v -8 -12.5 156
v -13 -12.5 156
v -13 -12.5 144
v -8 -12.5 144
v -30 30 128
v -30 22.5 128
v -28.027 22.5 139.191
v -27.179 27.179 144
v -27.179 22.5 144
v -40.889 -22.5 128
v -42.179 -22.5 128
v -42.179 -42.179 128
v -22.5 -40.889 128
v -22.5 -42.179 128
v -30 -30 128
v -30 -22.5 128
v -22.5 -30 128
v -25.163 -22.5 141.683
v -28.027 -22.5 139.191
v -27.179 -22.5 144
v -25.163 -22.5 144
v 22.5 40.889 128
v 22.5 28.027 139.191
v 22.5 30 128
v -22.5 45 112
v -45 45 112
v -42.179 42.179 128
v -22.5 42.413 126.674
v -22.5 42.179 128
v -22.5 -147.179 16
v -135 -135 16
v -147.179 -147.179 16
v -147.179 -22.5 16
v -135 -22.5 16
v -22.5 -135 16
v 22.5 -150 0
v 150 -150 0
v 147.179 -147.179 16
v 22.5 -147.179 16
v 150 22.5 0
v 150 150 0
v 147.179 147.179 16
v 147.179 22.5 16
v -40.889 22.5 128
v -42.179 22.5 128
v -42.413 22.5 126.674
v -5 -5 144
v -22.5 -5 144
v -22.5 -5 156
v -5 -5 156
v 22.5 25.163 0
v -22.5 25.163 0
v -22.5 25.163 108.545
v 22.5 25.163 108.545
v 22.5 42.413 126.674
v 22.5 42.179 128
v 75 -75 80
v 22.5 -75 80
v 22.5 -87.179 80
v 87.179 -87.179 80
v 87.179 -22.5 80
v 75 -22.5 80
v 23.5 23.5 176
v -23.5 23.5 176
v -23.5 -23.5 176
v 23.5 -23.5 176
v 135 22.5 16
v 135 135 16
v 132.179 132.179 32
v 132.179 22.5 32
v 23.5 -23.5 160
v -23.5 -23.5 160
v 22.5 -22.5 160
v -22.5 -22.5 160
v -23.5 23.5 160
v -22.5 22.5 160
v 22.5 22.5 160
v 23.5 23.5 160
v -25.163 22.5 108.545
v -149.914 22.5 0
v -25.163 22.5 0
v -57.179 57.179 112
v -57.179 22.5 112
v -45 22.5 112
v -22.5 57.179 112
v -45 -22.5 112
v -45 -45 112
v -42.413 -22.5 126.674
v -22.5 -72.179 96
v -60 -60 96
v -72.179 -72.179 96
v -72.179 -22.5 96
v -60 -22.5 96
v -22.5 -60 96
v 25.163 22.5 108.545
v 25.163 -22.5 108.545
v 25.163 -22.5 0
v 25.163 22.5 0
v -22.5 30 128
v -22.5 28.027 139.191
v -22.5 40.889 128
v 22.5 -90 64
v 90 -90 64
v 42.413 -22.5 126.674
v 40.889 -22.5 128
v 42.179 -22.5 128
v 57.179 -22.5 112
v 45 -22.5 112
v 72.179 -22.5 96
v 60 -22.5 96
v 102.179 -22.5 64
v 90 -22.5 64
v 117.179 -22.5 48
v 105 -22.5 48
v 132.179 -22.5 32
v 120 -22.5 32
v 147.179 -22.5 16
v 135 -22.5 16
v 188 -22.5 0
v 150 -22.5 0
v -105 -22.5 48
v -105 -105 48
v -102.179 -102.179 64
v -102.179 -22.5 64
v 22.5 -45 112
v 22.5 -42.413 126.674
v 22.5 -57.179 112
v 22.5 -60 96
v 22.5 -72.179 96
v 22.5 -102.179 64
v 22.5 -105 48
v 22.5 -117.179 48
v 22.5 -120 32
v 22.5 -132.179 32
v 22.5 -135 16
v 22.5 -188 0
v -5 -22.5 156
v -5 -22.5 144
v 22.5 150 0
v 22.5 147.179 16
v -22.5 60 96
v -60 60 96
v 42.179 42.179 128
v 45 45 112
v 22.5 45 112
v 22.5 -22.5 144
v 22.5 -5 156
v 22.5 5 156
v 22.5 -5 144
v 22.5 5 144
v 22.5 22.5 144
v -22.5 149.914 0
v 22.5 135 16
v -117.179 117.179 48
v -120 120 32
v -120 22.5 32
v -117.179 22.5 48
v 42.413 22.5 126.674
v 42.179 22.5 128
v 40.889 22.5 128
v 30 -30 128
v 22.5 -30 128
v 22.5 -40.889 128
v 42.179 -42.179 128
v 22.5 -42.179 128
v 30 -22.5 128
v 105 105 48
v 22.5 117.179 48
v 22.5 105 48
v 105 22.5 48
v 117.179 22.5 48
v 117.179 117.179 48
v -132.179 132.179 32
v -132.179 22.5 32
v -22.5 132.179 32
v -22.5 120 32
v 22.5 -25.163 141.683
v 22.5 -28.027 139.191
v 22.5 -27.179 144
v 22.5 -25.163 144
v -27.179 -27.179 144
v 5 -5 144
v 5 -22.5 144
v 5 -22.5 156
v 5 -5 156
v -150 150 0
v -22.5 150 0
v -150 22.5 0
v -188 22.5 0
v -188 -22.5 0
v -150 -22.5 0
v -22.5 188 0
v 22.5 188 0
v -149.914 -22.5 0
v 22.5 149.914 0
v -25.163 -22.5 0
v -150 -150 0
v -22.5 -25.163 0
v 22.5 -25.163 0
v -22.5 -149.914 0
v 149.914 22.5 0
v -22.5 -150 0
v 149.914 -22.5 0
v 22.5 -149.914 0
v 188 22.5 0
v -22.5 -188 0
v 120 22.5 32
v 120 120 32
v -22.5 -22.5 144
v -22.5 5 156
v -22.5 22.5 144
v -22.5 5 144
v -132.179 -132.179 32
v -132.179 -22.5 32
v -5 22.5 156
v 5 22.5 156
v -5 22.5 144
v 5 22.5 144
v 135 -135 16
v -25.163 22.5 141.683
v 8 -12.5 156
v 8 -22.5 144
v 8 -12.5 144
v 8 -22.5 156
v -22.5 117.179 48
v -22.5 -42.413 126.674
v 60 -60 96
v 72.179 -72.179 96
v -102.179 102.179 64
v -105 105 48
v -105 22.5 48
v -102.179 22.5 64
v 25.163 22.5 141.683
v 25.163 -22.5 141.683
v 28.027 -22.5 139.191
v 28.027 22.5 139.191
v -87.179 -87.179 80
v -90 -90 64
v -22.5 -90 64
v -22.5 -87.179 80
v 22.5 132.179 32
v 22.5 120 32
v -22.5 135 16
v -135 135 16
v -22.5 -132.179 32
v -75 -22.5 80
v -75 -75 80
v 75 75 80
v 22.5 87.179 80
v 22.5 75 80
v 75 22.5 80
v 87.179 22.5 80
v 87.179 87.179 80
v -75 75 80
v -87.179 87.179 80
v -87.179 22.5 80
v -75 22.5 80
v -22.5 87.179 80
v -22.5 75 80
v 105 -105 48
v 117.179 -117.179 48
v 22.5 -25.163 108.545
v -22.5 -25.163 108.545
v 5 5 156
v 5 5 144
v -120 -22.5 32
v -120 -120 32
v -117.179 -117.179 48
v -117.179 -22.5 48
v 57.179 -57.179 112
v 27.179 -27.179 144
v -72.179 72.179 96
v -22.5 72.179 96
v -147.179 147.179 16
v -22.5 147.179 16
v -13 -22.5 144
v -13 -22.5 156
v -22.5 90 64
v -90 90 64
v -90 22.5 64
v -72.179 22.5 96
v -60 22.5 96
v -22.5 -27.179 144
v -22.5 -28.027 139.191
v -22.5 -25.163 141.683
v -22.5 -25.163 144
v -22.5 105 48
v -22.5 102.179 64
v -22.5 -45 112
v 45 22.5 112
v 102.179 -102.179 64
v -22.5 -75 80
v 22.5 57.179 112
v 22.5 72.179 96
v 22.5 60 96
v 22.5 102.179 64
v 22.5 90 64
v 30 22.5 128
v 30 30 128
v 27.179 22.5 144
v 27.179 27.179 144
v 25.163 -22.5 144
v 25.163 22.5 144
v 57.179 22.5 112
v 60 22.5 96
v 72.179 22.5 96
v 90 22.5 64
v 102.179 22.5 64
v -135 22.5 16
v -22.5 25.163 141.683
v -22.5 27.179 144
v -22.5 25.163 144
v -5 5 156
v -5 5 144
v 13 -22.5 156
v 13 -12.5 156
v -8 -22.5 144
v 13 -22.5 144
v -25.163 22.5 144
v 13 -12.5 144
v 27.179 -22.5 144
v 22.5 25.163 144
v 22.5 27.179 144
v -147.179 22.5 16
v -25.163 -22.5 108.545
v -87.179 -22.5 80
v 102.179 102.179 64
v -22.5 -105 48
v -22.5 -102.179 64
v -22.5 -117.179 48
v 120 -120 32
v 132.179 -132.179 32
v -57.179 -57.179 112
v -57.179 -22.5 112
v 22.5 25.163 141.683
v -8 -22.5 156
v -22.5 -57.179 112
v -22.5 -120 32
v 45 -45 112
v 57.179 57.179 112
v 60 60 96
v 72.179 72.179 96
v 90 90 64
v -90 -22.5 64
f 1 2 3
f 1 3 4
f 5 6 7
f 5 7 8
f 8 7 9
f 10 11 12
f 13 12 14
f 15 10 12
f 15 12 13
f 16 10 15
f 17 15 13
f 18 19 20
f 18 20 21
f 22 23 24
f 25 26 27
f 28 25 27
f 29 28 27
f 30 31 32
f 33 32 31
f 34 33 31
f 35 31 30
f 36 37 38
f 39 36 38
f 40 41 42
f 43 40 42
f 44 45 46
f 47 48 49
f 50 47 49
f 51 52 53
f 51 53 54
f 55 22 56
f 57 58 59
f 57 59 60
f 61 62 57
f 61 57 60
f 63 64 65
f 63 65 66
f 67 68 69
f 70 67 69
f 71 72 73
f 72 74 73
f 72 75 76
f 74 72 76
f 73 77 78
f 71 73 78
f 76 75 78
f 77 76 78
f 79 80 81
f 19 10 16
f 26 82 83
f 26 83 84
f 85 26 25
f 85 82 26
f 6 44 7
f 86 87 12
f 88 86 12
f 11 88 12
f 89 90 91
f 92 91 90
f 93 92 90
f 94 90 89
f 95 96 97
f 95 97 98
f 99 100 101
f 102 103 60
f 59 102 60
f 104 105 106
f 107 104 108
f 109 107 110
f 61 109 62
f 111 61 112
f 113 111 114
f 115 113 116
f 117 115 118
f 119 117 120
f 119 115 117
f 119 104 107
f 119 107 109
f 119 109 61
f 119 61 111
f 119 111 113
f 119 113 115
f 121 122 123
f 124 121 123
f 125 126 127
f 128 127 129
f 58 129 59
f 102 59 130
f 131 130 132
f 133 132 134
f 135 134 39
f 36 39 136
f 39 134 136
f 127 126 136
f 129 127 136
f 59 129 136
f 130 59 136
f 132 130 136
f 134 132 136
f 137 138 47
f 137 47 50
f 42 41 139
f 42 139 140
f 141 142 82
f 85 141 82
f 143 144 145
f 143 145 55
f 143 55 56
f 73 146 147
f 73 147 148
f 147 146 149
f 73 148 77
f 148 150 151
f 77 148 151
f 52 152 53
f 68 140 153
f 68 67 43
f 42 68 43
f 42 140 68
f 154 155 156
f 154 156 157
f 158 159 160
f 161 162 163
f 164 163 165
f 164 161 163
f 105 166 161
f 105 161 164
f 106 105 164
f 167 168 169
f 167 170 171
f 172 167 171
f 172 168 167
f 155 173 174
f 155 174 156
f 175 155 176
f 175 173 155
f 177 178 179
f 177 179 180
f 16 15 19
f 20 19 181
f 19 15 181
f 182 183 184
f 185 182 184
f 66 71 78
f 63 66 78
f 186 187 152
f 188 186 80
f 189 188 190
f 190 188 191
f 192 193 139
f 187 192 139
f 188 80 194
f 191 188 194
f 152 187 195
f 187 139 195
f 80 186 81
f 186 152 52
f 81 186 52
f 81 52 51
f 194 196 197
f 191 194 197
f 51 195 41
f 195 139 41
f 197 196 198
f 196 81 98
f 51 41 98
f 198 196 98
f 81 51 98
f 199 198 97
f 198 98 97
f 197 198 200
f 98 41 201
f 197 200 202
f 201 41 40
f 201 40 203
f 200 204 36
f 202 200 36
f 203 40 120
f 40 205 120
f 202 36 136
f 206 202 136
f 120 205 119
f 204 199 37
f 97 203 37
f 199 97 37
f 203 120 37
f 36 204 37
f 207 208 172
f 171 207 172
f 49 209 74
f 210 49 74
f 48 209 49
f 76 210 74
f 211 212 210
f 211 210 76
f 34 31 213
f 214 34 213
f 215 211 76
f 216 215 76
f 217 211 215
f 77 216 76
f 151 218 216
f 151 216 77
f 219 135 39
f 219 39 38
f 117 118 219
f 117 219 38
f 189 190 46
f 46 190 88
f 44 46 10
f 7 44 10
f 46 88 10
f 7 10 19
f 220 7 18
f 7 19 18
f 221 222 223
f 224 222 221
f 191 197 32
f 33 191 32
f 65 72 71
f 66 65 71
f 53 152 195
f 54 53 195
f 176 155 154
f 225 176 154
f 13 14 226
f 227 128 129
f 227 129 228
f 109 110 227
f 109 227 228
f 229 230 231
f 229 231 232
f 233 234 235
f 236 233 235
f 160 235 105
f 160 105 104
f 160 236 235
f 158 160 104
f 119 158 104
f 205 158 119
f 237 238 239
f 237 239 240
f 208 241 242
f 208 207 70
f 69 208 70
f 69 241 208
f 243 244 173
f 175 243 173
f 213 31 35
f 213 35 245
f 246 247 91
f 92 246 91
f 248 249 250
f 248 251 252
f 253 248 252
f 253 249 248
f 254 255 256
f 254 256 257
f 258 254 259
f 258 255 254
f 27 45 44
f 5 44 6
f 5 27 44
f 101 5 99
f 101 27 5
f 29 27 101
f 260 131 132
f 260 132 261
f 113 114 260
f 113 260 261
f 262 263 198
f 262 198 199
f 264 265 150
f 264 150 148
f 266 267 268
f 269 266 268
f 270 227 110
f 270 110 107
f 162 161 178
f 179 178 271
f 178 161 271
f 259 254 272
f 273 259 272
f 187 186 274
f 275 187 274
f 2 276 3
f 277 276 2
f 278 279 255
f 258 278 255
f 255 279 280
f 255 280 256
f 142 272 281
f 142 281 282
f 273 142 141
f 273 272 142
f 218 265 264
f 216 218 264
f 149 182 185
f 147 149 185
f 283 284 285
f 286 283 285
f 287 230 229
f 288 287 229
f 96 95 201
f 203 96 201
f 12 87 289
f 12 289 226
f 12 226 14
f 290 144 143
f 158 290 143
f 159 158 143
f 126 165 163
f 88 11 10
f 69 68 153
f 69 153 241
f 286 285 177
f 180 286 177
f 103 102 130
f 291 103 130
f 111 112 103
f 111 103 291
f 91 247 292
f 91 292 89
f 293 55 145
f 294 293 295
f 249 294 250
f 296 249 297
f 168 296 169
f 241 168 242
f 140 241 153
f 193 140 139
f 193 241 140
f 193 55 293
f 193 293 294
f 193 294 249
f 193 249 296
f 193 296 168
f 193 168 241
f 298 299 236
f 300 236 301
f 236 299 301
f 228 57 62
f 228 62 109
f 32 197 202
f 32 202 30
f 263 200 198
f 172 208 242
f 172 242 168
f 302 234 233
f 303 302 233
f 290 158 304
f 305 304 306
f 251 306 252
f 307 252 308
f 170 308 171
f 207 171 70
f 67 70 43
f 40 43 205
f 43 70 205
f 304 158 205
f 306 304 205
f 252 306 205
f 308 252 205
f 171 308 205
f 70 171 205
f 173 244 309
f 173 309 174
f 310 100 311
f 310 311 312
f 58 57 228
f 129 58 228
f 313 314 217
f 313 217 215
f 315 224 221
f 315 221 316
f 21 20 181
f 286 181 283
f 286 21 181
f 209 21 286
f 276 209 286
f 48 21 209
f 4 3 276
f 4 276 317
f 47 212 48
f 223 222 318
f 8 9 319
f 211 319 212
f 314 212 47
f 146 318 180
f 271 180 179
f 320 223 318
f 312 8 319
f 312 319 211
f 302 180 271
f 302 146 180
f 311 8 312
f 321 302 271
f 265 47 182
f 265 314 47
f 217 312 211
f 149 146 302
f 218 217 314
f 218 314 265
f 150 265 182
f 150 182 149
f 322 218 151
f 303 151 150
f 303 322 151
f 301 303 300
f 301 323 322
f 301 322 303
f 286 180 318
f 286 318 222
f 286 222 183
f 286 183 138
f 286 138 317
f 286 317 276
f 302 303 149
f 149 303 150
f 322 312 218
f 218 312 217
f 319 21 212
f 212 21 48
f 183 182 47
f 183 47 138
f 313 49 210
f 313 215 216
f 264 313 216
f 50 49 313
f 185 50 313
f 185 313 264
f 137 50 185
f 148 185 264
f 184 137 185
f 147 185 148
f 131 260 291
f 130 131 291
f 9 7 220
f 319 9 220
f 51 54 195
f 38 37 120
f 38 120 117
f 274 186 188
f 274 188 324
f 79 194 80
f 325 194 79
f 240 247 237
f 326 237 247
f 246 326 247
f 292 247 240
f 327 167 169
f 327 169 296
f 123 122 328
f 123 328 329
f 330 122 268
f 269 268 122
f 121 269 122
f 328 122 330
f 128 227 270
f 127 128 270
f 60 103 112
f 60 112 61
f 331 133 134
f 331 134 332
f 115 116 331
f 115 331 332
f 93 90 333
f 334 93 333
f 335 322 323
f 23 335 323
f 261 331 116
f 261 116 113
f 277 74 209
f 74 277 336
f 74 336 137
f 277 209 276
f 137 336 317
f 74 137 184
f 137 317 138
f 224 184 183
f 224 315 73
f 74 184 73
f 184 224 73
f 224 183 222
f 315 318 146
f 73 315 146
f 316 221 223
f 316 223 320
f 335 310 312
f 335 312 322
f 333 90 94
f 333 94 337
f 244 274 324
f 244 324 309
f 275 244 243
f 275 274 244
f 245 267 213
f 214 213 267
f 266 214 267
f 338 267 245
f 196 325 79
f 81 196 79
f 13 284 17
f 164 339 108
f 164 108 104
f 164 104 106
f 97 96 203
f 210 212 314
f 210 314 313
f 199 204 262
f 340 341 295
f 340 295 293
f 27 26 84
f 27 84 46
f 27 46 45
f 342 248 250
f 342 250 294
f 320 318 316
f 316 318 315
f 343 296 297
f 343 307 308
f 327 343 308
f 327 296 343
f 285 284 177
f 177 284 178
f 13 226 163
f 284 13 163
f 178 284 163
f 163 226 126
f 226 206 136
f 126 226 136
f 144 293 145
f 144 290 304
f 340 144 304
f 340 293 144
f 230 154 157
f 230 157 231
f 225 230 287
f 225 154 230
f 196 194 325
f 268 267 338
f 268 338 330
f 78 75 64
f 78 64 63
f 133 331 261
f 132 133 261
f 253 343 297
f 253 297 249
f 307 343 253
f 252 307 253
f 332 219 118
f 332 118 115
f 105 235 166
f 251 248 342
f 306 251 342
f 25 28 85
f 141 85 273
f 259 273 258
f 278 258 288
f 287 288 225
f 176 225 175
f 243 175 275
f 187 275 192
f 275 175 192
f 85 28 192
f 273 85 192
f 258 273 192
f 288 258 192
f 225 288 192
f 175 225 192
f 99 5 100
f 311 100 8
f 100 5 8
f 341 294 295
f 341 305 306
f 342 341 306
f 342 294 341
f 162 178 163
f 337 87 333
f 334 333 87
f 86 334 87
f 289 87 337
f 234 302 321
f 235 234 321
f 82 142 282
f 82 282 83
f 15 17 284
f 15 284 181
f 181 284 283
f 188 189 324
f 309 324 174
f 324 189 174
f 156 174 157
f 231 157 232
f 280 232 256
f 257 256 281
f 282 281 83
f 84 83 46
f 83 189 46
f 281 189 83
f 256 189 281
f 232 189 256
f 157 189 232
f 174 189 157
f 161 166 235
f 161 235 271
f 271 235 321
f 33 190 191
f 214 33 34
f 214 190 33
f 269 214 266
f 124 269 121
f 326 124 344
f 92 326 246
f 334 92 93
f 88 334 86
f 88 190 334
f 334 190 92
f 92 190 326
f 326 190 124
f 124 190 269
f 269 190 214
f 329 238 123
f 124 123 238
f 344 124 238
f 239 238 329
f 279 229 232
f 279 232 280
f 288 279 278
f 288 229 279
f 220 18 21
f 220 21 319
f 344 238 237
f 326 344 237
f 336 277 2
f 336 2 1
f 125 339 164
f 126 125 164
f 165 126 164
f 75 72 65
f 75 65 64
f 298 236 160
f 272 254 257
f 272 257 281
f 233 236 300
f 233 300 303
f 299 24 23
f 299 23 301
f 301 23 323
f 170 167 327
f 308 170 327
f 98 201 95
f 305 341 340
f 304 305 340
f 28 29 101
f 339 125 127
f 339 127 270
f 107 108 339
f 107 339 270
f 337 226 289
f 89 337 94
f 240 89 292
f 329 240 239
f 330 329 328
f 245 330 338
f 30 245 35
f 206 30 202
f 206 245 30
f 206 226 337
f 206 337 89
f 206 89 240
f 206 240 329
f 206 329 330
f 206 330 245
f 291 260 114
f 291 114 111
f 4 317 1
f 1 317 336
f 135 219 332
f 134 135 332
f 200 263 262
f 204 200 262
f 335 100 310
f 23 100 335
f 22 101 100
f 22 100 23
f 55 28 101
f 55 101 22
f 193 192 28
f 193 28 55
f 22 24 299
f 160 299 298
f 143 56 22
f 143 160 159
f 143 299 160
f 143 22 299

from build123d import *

# Parameters (mm, degrees)
F0_W      = 300
F0_H      = 300
F1_DEPTH  = 16
F1_TAPER  = 10
F2_W      = 270
F2_H      = 270
F3_DEPTH  = 16
F3_TAPER  = 10
F4_W      = 240
F4_H      = 240
F5_DEPTH  = 16
F5_TAPER  = 10
F6_W      = 210
F6_H      = 210
F7_DEPTH  = 16
F7_TAPER  = 10
F8_W      = 180
F8_H      = 180
F9_DEPTH  = 16
F9_TAPER  = 10
F10_W     = 150
F10_H     = 150
F11_DEPTH = 16
F11_TAPER = 10
F12_W     = 120
F12_H     = 120
F13_DEPTH = 16
F13_TAPER = 10
F14_W     = 90
F14_H     = 90
F15_DEPTH = 16
F15_TAPER = 10
F16_W     = 60
F16_H     = 60
F17_DEPTH = 16
F17_TAPER = 10
F18_W     = 127.5
F18_H     = 45
F18_W_2   = 45
F18_H_2   = 127.5
F19_DEPTH = 144.001
F24_W     = 215.8472527365
F24_H     = 45
F25_DEPTH = 25
F35_DEPTH = 172.501
F36_W     = 45
F36_H     = 215.8472527365
F37_DEPTH = 25
F39_DEPTH = 172.501
F40_W     = 45
F40_H     = 16.4101098933
F41_DEPTH = 144.001
F42_W     = 45
F42_H     = 215.8472527365
F43_DEPTH = 25
F44_W     = 215.8472527365
F44_H     = 45
F45_DEPTH = 25
F47_DEPTH = 210.501
F49_DEPTH = 210.501
F51_DEPTH = 144.001
F52_W     = 2.6628427036
F52_H     = 45
F53_DEPTH = 144.001
F54_W     = 45
F54_H     = 2.6628427036
F54_H_2   = 45
F54_W_2   = 2.6628427036
F55_DEPTH = 144
F57_W     = 45
F57_H     = 45
F58_DEPTH = 16
F59_W     = 47
F59_H     = 47
F60_DEPTH = 16
F61_W     = 10
F61_H     = 12
F62_DEPTH = 210.501
F61_W_2   = 5
F63_DEPTH = 10
F64_W     = 10
F64_H     = 12
F65_DEPTH = 210.501


with BuildPart() as f1:
    # F0 (on Top) → F1 (new body)
    with BuildSketch(Plane.XY):
        Rectangle(F0_W, F0_H)
    extrude(amount=F1_DEPTH, taper=F1_TAPER)

    # F2 (on face) → F3 (join)
    with BuildSketch(Plane.XY.offset(16)):
        Rectangle(F2_W, F2_H)
    extrude(amount=F3_DEPTH, taper=F3_TAPER)

    # F4 (on face) → F5 (join)
    with BuildSketch(Plane.XY.offset(32)):
        Rectangle(F4_W, F4_H)
    extrude(amount=F5_DEPTH, taper=F5_TAPER)

    # F6 (on face) → F7 (join)
    with BuildSketch(Plane.XY.offset(48)):
        Rectangle(F6_W, F6_H)
    extrude(amount=F7_DEPTH, taper=F7_TAPER)

    # F8 (on face) → F9 (join)
    with BuildSketch(Plane.XY.offset(64)):
        Rectangle(F8_W, F8_H)
    extrude(amount=F9_DEPTH, taper=F9_TAPER)

    # F10 (on face) → F11 (join)
    with BuildSketch(Plane.XY.offset(80)):
        Rectangle(F10_W, F10_H)
    extrude(amount=F11_DEPTH, taper=F11_TAPER)

    # F12 (on face) → F13 (join)
    with BuildSketch(Plane.XY.offset(96)):
        Rectangle(F12_W, F12_H)
    extrude(amount=F13_DEPTH, taper=F13_TAPER)

    # F14 (on face) → F15 (join)
    with BuildSketch(Plane.XY.offset(112)):
        Rectangle(F14_W, F14_H)
    extrude(amount=F15_DEPTH, taper=F15_TAPER)

    # F16 (on face) → F17 (join)
    with BuildSketch(Plane.XY.offset(128)):
        Rectangle(F16_W, F16_H)
    extrude(amount=F17_DEPTH, taper=F17_TAPER)

    # F18 (on face) → F19 (cut, through all)
    with BuildSketch(Plane.XY.offset(144)):
        with Locations((86.25, 0)):
            Rectangle(F18_W, F18_H)
        Rectangle(F18_W_2, F18_H)
        with Locations((0, 86.25)):
            Rectangle(F18_W_2, F18_H_2)
        with Locations((-86.25, 0)):
            Rectangle(F18_W, F18_H)
        with Locations((0, -86.25)):
            Rectangle(F18_W_2, F18_H_2)
    extrude(amount=-F19_DEPTH, mode=Mode.SUBTRACT)


with BuildPart() as f25:
    # F24 (on 3pt) → F25 (new body)
    with BuildSketch(Plane(origin=(81.002945378, 0, 93.0971351393), x_dir=(0.7544092187, 0, -0.6564043957), z_dir=(0.6564043957, 0, 0.7544092187))):
        with Locations((33.9053067481, 0)):
            Rectangle(F24_W, F24_H)
    extrude(amount=-F25_DEPTH)

    # F34 (on face) → F35 (cut, through all)
    with BuildSketch(Plane(origin=(0, 22.5, 0), x_dir=(-1, 0, 0), z_dir=(0, 1, 0))):
        Polygon((-8.7527328104, 122.822855035), (-22.5, 138.6226655897), (-22.5, 110.8614866041), align=None)
        Polygon((-171.5898901067, -18.8602304676), (-149.9137224513, 0), (-188, 0), align=None)
    extrude(amount=-F35_DEPTH, mode=Mode.SUBTRACT)

    # F52 (on face) → F53 (cut, through all)
    with BuildSketch(Plane.XY.offset(144)):
        with Locations((23.8314213518, 0)):
            Rectangle(F52_W, F52_H)
    extrude(amount=-F53_DEPTH, mode=Mode.SUBTRACT)


with BuildPart() as f37:
    # F36 (on 3pt) → F37 (new body)
    with BuildSketch(Plane(origin=(0, 81.002945378, 93.0971351393), x_dir=(1, 0, 0), z_dir=(0, 0.6564043957, 0.7544092187))):
        with Locations((0, 33.9053067481)):
            Rectangle(F36_W, F36_H)
    extrude(amount=-F37_DEPTH)

    # F38 (on face) → F39 (cut, through all)
    with BuildSketch(Plane.YZ.offset(22.5)):
        Polygon((171.5898901067, -18.8602304676), (188, 0), (149.9137224513, 0), align=None)
    extrude(amount=-F39_DEPTH, mode=Mode.SUBTRACT)

    # F40 (on face) → F41 (cut, through all)
    with BuildSketch(Plane.XY.offset(144)):
        with Locations((0, 16.957787757)):
            Rectangle(F40_W, F40_H)
    extrude(amount=-F41_DEPTH, mode=Mode.SUBTRACT)


with BuildPart() as f43:
    # F42 (on 3pt) → F43 (new body)
    with BuildSketch(Plane(origin=(0, -81.002945378, 93.0971351393), x_dir=(1, 0, 0), z_dir=(0, 0.6564043957, -0.7544092187))):
        with Locations((0, 33.9053067481)):
            Rectangle(F42_W, F42_H)
    extrude(amount=F43_DEPTH)

    # F46 (on face) → F47 (cut, through all)
    with BuildSketch(Plane(origin=(-22.5, 0, 0), x_dir=(0, -1, 0), z_dir=(-1, 0, 0))):
        Polygon((171.5898901067, -18.8602304676), (188, 0), (149.9137224513, 0), align=None)
    extrude(amount=-F47_DEPTH, mode=Mode.SUBTRACT)


with BuildPart() as f45:
    # F44 (on 3pt) → F45 (new body)
    with BuildSketch(Plane(origin=(-81.002945378, 0, 93.0971351393), x_dir=(0.7544092187, 0, 0.6564043957), z_dir=(0.6564043957, 0, -0.7544092187))):
        with Locations((-33.9053067481, 0)):
            Rectangle(F44_W, F44_H)
    extrude(amount=F45_DEPTH)

    # F48 (on face) → F49 (cut, through all)
    with BuildSketch(Plane(origin=(0, 22.5, 0), x_dir=(-1, 0, 0), z_dir=(0, 1, 0))):
        Polygon((171.5898901067, -18.8602304676), (188, 0), (149.9137224513, 0), align=None)
    extrude(amount=-F49_DEPTH, mode=Mode.SUBTRACT)


with BuildPart() as f51_tool:
    # F50 (on face) → F51 (new body, through all)
    with BuildSketch(Plane.XY.offset(144)):
        Polygon((-22.5, -25.1628427036), (22.5, -25.1628427036), (22.5, -8.7527328104), (-8.7527328104, -8.7527328104), (-8.7527328104, 22.5), (-25.1628427036, 22.5), (-25.1628427036, -22.5), (-22.5, -22.5), align=None)
    extrude(amount=-F51_DEPTH)


with BuildPart() as f43_1:
    add(f43.part)

    # F51: cut by f51_tool
    add(f51_tool.part, mode=Mode.SUBTRACT)


with BuildPart() as f45_1:
    add(f45.part)

    # F51: cut by f51_tool
    add(f51_tool.part, mode=Mode.SUBTRACT)


with BuildPart() as f55:
    # F54 (on Top) → F55 (new body)
    with BuildSketch(Plane.XY):
        with Locations((0, -23.8314213518)):
            Rectangle(F54_W, F54_H)
        Rectangle(F54_W, F54_H_2)
        with Locations((23.8314213518, 0)):
            Rectangle(F54_W_2, F54_H_2)
        with Locations((-23.8314213518, 0)):
            Rectangle(F54_W_2, F54_H_2)
        with Locations((0, 23.8314213518)):
            Rectangle(F54_W, F54_H)
    extrude(amount=F55_DEPTH)


with BuildPart() as f1_1:
    add(f1.part)

    # F56: union F25, F43, F45, F55, F37
    add(f25.part)
    add(f43_1.part)
    add(f45_1.part)
    add(f55.part)
    add(f37.part)

    # F57 (on face) → F58 (join)
    with BuildSketch(Plane.XY.offset(144)):
        Rectangle(F57_W, F57_H)
    extrude(amount=F58_DEPTH)

    # F59 (on face) → F60 (join)
    with BuildSketch(Plane.XY.offset(160)):
        Rectangle(F59_W, F59_H)
    extrude(amount=F60_DEPTH)

    # F61 (on face) → F62 (cut, through all)
    with BuildSketch(Plane.XZ.offset(22.5)):
        with Locations((0, 150)):
            Rectangle(F61_W, F61_H)
    extrude(amount=-F62_DEPTH, mode=Mode.SUBTRACT)

    # F61 (on face) → F63 (cut)
    with BuildSketch(Plane.XZ.offset(22.5)):
        with Locations((-10.5, 150)):
            Rectangle(F61_W_2, F61_H)
        with Locations((10.5, 150)):
            Rectangle(F61_W_2, F61_H)
    extrude(amount=-F63_DEPTH, mode=Mode.SUBTRACT)

    # F64 (on face) → F65 (cut, through all)
    with BuildSketch(Plane(origin=(-22.5, 0, 0), x_dir=(0, -1, 0), z_dir=(-1, 0, 0))):
        with Locations((0, 150)):
            Rectangle(F64_W, F64_H)
    extrude(amount=-F65_DEPTH, mode=Mode.SUBTRACT)


solid = f1_1.part
